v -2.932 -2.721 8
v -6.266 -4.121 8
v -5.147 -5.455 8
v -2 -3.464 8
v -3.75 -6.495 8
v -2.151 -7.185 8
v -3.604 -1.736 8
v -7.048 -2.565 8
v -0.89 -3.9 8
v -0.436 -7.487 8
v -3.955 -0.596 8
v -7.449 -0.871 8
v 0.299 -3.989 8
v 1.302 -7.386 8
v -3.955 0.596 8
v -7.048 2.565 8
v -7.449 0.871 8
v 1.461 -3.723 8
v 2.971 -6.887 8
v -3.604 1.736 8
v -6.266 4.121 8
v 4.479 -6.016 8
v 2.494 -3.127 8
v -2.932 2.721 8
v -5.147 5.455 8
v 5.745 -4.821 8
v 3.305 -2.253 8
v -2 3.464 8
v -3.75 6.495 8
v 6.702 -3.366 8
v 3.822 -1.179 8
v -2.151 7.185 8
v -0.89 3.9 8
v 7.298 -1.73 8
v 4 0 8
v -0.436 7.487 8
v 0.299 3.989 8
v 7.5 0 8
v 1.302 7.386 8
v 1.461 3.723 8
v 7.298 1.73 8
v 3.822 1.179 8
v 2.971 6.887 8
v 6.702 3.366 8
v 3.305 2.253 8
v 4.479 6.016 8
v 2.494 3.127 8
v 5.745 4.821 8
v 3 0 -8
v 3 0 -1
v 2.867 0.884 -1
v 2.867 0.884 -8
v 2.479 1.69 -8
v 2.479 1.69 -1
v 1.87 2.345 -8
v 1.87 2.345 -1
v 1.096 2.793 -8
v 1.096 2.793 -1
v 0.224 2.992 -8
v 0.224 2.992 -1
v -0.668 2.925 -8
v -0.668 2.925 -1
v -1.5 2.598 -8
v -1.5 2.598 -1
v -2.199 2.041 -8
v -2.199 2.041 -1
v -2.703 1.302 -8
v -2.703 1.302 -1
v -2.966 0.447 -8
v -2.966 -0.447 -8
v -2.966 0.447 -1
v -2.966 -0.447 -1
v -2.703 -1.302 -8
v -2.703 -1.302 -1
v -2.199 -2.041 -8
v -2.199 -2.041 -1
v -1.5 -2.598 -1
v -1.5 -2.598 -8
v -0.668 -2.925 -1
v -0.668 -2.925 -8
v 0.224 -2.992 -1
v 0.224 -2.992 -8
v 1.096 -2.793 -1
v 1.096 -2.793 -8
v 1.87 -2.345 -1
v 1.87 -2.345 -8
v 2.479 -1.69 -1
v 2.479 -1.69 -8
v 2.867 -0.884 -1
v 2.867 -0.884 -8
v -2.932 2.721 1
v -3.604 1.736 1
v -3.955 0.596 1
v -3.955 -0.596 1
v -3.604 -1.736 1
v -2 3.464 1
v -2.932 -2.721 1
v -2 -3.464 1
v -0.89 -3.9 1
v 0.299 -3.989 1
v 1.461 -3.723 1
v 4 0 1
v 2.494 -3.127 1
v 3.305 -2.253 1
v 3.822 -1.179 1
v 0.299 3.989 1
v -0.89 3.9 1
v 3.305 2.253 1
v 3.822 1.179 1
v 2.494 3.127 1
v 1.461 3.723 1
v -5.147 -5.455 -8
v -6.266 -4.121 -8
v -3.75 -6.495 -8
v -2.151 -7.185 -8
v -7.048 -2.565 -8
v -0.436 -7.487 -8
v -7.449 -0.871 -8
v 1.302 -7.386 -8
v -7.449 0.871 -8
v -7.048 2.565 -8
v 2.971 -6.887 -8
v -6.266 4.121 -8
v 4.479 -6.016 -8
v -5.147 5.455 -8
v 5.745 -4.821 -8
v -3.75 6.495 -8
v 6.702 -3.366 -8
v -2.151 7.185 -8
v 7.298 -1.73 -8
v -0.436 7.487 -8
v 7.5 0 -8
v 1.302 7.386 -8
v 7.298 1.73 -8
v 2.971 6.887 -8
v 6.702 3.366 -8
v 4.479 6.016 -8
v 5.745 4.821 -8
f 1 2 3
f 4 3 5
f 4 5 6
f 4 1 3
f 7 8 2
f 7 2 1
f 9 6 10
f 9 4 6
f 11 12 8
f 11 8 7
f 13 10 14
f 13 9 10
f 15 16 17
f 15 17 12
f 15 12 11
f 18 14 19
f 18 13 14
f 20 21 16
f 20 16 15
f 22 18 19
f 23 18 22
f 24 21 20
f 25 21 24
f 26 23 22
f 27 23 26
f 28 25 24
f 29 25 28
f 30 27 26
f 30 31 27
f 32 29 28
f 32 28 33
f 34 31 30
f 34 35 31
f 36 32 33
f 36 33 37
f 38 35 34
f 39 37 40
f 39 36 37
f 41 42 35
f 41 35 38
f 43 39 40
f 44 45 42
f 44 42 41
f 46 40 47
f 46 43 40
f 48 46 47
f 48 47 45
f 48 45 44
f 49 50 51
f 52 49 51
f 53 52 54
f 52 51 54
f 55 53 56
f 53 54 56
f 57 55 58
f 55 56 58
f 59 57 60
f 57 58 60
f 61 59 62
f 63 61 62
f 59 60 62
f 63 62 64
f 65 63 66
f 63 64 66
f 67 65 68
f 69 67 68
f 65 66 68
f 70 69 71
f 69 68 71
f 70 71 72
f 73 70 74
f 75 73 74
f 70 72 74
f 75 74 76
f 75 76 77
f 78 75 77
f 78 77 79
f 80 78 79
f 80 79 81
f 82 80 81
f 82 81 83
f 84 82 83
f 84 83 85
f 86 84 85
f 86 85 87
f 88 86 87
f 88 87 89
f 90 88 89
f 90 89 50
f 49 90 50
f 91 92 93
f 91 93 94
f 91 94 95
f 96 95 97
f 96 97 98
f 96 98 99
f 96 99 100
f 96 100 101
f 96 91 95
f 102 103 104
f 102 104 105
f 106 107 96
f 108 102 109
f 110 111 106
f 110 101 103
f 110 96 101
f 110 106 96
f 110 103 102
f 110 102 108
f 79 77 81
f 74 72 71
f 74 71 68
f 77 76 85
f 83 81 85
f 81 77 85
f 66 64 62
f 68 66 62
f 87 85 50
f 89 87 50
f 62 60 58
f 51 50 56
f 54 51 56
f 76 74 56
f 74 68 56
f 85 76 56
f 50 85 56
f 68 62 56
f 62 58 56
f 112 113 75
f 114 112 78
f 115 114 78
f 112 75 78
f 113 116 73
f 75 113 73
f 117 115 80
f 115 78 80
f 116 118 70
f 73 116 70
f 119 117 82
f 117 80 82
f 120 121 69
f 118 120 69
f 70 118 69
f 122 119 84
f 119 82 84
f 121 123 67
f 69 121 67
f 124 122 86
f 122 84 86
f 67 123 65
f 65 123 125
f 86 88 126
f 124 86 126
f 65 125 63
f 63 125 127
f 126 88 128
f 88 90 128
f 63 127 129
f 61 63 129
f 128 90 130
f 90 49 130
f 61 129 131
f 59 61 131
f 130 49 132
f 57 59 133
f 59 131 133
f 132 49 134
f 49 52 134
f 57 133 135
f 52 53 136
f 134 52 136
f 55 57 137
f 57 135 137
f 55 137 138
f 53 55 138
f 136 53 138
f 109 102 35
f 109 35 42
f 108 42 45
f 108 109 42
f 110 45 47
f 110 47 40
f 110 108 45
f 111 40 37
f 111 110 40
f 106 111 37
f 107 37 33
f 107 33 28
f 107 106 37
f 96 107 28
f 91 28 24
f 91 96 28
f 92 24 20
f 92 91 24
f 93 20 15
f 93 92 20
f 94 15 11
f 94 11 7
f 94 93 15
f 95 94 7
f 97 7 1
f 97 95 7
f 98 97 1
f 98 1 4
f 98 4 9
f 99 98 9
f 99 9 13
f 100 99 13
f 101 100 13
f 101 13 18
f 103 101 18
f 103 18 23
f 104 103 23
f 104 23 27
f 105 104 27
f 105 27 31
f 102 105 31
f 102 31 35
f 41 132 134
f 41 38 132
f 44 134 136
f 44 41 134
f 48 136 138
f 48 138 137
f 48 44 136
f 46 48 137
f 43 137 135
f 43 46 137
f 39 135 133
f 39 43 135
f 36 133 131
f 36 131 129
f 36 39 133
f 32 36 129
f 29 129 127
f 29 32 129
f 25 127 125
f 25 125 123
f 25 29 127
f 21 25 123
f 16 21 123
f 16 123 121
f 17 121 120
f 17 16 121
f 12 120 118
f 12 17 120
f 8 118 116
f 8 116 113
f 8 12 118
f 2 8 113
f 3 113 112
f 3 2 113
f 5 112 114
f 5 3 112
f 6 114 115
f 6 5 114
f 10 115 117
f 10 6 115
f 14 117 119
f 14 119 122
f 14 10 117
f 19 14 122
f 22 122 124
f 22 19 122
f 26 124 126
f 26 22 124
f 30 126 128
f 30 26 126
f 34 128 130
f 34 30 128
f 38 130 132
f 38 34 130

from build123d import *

# Parameters (mm, degrees)
F0_R          = 7.5
F0_R_2        = 4
F1_DEPTH      = 8
F0_R_3        = 3
F2_DEPTH      = 8
F3_DEPTH      = 1
F3_DEPTH_BACK = 1


with BuildPart() as f1:
    # F0 (on Top) → F1 (new body)
    with BuildSketch(Plane.XY):
        Circle(F0_R)
        Circle(F0_R_2, mode=Mode.SUBTRACT)
    extrude(amount=F1_DEPTH)

    # F0 (on Top) → F2 (join)
    with BuildSketch(Plane.XY):
        Circle(F0_R)
        Circle(F0_R_2, mode=Mode.SUBTRACT)
        Circle(F0_R_2)
        Circle(F0_R_3, mode=Mode.SUBTRACT)
    extrude(amount=-F2_DEPTH)

    # F0 (on Top) → F3 (join, two sides)
    with BuildSketch(Plane.XY) as f3_sk:
        Circle(F0_R_2)
        Circle(F0_R_3, mode=Mode.SUBTRACT)
        Circle(F0_R_3)
    extrude(amount=F3_DEPTH)
    extrude(f3_sk.sketch, amount=-F3_DEPTH_BACK)


solid = f1.part
